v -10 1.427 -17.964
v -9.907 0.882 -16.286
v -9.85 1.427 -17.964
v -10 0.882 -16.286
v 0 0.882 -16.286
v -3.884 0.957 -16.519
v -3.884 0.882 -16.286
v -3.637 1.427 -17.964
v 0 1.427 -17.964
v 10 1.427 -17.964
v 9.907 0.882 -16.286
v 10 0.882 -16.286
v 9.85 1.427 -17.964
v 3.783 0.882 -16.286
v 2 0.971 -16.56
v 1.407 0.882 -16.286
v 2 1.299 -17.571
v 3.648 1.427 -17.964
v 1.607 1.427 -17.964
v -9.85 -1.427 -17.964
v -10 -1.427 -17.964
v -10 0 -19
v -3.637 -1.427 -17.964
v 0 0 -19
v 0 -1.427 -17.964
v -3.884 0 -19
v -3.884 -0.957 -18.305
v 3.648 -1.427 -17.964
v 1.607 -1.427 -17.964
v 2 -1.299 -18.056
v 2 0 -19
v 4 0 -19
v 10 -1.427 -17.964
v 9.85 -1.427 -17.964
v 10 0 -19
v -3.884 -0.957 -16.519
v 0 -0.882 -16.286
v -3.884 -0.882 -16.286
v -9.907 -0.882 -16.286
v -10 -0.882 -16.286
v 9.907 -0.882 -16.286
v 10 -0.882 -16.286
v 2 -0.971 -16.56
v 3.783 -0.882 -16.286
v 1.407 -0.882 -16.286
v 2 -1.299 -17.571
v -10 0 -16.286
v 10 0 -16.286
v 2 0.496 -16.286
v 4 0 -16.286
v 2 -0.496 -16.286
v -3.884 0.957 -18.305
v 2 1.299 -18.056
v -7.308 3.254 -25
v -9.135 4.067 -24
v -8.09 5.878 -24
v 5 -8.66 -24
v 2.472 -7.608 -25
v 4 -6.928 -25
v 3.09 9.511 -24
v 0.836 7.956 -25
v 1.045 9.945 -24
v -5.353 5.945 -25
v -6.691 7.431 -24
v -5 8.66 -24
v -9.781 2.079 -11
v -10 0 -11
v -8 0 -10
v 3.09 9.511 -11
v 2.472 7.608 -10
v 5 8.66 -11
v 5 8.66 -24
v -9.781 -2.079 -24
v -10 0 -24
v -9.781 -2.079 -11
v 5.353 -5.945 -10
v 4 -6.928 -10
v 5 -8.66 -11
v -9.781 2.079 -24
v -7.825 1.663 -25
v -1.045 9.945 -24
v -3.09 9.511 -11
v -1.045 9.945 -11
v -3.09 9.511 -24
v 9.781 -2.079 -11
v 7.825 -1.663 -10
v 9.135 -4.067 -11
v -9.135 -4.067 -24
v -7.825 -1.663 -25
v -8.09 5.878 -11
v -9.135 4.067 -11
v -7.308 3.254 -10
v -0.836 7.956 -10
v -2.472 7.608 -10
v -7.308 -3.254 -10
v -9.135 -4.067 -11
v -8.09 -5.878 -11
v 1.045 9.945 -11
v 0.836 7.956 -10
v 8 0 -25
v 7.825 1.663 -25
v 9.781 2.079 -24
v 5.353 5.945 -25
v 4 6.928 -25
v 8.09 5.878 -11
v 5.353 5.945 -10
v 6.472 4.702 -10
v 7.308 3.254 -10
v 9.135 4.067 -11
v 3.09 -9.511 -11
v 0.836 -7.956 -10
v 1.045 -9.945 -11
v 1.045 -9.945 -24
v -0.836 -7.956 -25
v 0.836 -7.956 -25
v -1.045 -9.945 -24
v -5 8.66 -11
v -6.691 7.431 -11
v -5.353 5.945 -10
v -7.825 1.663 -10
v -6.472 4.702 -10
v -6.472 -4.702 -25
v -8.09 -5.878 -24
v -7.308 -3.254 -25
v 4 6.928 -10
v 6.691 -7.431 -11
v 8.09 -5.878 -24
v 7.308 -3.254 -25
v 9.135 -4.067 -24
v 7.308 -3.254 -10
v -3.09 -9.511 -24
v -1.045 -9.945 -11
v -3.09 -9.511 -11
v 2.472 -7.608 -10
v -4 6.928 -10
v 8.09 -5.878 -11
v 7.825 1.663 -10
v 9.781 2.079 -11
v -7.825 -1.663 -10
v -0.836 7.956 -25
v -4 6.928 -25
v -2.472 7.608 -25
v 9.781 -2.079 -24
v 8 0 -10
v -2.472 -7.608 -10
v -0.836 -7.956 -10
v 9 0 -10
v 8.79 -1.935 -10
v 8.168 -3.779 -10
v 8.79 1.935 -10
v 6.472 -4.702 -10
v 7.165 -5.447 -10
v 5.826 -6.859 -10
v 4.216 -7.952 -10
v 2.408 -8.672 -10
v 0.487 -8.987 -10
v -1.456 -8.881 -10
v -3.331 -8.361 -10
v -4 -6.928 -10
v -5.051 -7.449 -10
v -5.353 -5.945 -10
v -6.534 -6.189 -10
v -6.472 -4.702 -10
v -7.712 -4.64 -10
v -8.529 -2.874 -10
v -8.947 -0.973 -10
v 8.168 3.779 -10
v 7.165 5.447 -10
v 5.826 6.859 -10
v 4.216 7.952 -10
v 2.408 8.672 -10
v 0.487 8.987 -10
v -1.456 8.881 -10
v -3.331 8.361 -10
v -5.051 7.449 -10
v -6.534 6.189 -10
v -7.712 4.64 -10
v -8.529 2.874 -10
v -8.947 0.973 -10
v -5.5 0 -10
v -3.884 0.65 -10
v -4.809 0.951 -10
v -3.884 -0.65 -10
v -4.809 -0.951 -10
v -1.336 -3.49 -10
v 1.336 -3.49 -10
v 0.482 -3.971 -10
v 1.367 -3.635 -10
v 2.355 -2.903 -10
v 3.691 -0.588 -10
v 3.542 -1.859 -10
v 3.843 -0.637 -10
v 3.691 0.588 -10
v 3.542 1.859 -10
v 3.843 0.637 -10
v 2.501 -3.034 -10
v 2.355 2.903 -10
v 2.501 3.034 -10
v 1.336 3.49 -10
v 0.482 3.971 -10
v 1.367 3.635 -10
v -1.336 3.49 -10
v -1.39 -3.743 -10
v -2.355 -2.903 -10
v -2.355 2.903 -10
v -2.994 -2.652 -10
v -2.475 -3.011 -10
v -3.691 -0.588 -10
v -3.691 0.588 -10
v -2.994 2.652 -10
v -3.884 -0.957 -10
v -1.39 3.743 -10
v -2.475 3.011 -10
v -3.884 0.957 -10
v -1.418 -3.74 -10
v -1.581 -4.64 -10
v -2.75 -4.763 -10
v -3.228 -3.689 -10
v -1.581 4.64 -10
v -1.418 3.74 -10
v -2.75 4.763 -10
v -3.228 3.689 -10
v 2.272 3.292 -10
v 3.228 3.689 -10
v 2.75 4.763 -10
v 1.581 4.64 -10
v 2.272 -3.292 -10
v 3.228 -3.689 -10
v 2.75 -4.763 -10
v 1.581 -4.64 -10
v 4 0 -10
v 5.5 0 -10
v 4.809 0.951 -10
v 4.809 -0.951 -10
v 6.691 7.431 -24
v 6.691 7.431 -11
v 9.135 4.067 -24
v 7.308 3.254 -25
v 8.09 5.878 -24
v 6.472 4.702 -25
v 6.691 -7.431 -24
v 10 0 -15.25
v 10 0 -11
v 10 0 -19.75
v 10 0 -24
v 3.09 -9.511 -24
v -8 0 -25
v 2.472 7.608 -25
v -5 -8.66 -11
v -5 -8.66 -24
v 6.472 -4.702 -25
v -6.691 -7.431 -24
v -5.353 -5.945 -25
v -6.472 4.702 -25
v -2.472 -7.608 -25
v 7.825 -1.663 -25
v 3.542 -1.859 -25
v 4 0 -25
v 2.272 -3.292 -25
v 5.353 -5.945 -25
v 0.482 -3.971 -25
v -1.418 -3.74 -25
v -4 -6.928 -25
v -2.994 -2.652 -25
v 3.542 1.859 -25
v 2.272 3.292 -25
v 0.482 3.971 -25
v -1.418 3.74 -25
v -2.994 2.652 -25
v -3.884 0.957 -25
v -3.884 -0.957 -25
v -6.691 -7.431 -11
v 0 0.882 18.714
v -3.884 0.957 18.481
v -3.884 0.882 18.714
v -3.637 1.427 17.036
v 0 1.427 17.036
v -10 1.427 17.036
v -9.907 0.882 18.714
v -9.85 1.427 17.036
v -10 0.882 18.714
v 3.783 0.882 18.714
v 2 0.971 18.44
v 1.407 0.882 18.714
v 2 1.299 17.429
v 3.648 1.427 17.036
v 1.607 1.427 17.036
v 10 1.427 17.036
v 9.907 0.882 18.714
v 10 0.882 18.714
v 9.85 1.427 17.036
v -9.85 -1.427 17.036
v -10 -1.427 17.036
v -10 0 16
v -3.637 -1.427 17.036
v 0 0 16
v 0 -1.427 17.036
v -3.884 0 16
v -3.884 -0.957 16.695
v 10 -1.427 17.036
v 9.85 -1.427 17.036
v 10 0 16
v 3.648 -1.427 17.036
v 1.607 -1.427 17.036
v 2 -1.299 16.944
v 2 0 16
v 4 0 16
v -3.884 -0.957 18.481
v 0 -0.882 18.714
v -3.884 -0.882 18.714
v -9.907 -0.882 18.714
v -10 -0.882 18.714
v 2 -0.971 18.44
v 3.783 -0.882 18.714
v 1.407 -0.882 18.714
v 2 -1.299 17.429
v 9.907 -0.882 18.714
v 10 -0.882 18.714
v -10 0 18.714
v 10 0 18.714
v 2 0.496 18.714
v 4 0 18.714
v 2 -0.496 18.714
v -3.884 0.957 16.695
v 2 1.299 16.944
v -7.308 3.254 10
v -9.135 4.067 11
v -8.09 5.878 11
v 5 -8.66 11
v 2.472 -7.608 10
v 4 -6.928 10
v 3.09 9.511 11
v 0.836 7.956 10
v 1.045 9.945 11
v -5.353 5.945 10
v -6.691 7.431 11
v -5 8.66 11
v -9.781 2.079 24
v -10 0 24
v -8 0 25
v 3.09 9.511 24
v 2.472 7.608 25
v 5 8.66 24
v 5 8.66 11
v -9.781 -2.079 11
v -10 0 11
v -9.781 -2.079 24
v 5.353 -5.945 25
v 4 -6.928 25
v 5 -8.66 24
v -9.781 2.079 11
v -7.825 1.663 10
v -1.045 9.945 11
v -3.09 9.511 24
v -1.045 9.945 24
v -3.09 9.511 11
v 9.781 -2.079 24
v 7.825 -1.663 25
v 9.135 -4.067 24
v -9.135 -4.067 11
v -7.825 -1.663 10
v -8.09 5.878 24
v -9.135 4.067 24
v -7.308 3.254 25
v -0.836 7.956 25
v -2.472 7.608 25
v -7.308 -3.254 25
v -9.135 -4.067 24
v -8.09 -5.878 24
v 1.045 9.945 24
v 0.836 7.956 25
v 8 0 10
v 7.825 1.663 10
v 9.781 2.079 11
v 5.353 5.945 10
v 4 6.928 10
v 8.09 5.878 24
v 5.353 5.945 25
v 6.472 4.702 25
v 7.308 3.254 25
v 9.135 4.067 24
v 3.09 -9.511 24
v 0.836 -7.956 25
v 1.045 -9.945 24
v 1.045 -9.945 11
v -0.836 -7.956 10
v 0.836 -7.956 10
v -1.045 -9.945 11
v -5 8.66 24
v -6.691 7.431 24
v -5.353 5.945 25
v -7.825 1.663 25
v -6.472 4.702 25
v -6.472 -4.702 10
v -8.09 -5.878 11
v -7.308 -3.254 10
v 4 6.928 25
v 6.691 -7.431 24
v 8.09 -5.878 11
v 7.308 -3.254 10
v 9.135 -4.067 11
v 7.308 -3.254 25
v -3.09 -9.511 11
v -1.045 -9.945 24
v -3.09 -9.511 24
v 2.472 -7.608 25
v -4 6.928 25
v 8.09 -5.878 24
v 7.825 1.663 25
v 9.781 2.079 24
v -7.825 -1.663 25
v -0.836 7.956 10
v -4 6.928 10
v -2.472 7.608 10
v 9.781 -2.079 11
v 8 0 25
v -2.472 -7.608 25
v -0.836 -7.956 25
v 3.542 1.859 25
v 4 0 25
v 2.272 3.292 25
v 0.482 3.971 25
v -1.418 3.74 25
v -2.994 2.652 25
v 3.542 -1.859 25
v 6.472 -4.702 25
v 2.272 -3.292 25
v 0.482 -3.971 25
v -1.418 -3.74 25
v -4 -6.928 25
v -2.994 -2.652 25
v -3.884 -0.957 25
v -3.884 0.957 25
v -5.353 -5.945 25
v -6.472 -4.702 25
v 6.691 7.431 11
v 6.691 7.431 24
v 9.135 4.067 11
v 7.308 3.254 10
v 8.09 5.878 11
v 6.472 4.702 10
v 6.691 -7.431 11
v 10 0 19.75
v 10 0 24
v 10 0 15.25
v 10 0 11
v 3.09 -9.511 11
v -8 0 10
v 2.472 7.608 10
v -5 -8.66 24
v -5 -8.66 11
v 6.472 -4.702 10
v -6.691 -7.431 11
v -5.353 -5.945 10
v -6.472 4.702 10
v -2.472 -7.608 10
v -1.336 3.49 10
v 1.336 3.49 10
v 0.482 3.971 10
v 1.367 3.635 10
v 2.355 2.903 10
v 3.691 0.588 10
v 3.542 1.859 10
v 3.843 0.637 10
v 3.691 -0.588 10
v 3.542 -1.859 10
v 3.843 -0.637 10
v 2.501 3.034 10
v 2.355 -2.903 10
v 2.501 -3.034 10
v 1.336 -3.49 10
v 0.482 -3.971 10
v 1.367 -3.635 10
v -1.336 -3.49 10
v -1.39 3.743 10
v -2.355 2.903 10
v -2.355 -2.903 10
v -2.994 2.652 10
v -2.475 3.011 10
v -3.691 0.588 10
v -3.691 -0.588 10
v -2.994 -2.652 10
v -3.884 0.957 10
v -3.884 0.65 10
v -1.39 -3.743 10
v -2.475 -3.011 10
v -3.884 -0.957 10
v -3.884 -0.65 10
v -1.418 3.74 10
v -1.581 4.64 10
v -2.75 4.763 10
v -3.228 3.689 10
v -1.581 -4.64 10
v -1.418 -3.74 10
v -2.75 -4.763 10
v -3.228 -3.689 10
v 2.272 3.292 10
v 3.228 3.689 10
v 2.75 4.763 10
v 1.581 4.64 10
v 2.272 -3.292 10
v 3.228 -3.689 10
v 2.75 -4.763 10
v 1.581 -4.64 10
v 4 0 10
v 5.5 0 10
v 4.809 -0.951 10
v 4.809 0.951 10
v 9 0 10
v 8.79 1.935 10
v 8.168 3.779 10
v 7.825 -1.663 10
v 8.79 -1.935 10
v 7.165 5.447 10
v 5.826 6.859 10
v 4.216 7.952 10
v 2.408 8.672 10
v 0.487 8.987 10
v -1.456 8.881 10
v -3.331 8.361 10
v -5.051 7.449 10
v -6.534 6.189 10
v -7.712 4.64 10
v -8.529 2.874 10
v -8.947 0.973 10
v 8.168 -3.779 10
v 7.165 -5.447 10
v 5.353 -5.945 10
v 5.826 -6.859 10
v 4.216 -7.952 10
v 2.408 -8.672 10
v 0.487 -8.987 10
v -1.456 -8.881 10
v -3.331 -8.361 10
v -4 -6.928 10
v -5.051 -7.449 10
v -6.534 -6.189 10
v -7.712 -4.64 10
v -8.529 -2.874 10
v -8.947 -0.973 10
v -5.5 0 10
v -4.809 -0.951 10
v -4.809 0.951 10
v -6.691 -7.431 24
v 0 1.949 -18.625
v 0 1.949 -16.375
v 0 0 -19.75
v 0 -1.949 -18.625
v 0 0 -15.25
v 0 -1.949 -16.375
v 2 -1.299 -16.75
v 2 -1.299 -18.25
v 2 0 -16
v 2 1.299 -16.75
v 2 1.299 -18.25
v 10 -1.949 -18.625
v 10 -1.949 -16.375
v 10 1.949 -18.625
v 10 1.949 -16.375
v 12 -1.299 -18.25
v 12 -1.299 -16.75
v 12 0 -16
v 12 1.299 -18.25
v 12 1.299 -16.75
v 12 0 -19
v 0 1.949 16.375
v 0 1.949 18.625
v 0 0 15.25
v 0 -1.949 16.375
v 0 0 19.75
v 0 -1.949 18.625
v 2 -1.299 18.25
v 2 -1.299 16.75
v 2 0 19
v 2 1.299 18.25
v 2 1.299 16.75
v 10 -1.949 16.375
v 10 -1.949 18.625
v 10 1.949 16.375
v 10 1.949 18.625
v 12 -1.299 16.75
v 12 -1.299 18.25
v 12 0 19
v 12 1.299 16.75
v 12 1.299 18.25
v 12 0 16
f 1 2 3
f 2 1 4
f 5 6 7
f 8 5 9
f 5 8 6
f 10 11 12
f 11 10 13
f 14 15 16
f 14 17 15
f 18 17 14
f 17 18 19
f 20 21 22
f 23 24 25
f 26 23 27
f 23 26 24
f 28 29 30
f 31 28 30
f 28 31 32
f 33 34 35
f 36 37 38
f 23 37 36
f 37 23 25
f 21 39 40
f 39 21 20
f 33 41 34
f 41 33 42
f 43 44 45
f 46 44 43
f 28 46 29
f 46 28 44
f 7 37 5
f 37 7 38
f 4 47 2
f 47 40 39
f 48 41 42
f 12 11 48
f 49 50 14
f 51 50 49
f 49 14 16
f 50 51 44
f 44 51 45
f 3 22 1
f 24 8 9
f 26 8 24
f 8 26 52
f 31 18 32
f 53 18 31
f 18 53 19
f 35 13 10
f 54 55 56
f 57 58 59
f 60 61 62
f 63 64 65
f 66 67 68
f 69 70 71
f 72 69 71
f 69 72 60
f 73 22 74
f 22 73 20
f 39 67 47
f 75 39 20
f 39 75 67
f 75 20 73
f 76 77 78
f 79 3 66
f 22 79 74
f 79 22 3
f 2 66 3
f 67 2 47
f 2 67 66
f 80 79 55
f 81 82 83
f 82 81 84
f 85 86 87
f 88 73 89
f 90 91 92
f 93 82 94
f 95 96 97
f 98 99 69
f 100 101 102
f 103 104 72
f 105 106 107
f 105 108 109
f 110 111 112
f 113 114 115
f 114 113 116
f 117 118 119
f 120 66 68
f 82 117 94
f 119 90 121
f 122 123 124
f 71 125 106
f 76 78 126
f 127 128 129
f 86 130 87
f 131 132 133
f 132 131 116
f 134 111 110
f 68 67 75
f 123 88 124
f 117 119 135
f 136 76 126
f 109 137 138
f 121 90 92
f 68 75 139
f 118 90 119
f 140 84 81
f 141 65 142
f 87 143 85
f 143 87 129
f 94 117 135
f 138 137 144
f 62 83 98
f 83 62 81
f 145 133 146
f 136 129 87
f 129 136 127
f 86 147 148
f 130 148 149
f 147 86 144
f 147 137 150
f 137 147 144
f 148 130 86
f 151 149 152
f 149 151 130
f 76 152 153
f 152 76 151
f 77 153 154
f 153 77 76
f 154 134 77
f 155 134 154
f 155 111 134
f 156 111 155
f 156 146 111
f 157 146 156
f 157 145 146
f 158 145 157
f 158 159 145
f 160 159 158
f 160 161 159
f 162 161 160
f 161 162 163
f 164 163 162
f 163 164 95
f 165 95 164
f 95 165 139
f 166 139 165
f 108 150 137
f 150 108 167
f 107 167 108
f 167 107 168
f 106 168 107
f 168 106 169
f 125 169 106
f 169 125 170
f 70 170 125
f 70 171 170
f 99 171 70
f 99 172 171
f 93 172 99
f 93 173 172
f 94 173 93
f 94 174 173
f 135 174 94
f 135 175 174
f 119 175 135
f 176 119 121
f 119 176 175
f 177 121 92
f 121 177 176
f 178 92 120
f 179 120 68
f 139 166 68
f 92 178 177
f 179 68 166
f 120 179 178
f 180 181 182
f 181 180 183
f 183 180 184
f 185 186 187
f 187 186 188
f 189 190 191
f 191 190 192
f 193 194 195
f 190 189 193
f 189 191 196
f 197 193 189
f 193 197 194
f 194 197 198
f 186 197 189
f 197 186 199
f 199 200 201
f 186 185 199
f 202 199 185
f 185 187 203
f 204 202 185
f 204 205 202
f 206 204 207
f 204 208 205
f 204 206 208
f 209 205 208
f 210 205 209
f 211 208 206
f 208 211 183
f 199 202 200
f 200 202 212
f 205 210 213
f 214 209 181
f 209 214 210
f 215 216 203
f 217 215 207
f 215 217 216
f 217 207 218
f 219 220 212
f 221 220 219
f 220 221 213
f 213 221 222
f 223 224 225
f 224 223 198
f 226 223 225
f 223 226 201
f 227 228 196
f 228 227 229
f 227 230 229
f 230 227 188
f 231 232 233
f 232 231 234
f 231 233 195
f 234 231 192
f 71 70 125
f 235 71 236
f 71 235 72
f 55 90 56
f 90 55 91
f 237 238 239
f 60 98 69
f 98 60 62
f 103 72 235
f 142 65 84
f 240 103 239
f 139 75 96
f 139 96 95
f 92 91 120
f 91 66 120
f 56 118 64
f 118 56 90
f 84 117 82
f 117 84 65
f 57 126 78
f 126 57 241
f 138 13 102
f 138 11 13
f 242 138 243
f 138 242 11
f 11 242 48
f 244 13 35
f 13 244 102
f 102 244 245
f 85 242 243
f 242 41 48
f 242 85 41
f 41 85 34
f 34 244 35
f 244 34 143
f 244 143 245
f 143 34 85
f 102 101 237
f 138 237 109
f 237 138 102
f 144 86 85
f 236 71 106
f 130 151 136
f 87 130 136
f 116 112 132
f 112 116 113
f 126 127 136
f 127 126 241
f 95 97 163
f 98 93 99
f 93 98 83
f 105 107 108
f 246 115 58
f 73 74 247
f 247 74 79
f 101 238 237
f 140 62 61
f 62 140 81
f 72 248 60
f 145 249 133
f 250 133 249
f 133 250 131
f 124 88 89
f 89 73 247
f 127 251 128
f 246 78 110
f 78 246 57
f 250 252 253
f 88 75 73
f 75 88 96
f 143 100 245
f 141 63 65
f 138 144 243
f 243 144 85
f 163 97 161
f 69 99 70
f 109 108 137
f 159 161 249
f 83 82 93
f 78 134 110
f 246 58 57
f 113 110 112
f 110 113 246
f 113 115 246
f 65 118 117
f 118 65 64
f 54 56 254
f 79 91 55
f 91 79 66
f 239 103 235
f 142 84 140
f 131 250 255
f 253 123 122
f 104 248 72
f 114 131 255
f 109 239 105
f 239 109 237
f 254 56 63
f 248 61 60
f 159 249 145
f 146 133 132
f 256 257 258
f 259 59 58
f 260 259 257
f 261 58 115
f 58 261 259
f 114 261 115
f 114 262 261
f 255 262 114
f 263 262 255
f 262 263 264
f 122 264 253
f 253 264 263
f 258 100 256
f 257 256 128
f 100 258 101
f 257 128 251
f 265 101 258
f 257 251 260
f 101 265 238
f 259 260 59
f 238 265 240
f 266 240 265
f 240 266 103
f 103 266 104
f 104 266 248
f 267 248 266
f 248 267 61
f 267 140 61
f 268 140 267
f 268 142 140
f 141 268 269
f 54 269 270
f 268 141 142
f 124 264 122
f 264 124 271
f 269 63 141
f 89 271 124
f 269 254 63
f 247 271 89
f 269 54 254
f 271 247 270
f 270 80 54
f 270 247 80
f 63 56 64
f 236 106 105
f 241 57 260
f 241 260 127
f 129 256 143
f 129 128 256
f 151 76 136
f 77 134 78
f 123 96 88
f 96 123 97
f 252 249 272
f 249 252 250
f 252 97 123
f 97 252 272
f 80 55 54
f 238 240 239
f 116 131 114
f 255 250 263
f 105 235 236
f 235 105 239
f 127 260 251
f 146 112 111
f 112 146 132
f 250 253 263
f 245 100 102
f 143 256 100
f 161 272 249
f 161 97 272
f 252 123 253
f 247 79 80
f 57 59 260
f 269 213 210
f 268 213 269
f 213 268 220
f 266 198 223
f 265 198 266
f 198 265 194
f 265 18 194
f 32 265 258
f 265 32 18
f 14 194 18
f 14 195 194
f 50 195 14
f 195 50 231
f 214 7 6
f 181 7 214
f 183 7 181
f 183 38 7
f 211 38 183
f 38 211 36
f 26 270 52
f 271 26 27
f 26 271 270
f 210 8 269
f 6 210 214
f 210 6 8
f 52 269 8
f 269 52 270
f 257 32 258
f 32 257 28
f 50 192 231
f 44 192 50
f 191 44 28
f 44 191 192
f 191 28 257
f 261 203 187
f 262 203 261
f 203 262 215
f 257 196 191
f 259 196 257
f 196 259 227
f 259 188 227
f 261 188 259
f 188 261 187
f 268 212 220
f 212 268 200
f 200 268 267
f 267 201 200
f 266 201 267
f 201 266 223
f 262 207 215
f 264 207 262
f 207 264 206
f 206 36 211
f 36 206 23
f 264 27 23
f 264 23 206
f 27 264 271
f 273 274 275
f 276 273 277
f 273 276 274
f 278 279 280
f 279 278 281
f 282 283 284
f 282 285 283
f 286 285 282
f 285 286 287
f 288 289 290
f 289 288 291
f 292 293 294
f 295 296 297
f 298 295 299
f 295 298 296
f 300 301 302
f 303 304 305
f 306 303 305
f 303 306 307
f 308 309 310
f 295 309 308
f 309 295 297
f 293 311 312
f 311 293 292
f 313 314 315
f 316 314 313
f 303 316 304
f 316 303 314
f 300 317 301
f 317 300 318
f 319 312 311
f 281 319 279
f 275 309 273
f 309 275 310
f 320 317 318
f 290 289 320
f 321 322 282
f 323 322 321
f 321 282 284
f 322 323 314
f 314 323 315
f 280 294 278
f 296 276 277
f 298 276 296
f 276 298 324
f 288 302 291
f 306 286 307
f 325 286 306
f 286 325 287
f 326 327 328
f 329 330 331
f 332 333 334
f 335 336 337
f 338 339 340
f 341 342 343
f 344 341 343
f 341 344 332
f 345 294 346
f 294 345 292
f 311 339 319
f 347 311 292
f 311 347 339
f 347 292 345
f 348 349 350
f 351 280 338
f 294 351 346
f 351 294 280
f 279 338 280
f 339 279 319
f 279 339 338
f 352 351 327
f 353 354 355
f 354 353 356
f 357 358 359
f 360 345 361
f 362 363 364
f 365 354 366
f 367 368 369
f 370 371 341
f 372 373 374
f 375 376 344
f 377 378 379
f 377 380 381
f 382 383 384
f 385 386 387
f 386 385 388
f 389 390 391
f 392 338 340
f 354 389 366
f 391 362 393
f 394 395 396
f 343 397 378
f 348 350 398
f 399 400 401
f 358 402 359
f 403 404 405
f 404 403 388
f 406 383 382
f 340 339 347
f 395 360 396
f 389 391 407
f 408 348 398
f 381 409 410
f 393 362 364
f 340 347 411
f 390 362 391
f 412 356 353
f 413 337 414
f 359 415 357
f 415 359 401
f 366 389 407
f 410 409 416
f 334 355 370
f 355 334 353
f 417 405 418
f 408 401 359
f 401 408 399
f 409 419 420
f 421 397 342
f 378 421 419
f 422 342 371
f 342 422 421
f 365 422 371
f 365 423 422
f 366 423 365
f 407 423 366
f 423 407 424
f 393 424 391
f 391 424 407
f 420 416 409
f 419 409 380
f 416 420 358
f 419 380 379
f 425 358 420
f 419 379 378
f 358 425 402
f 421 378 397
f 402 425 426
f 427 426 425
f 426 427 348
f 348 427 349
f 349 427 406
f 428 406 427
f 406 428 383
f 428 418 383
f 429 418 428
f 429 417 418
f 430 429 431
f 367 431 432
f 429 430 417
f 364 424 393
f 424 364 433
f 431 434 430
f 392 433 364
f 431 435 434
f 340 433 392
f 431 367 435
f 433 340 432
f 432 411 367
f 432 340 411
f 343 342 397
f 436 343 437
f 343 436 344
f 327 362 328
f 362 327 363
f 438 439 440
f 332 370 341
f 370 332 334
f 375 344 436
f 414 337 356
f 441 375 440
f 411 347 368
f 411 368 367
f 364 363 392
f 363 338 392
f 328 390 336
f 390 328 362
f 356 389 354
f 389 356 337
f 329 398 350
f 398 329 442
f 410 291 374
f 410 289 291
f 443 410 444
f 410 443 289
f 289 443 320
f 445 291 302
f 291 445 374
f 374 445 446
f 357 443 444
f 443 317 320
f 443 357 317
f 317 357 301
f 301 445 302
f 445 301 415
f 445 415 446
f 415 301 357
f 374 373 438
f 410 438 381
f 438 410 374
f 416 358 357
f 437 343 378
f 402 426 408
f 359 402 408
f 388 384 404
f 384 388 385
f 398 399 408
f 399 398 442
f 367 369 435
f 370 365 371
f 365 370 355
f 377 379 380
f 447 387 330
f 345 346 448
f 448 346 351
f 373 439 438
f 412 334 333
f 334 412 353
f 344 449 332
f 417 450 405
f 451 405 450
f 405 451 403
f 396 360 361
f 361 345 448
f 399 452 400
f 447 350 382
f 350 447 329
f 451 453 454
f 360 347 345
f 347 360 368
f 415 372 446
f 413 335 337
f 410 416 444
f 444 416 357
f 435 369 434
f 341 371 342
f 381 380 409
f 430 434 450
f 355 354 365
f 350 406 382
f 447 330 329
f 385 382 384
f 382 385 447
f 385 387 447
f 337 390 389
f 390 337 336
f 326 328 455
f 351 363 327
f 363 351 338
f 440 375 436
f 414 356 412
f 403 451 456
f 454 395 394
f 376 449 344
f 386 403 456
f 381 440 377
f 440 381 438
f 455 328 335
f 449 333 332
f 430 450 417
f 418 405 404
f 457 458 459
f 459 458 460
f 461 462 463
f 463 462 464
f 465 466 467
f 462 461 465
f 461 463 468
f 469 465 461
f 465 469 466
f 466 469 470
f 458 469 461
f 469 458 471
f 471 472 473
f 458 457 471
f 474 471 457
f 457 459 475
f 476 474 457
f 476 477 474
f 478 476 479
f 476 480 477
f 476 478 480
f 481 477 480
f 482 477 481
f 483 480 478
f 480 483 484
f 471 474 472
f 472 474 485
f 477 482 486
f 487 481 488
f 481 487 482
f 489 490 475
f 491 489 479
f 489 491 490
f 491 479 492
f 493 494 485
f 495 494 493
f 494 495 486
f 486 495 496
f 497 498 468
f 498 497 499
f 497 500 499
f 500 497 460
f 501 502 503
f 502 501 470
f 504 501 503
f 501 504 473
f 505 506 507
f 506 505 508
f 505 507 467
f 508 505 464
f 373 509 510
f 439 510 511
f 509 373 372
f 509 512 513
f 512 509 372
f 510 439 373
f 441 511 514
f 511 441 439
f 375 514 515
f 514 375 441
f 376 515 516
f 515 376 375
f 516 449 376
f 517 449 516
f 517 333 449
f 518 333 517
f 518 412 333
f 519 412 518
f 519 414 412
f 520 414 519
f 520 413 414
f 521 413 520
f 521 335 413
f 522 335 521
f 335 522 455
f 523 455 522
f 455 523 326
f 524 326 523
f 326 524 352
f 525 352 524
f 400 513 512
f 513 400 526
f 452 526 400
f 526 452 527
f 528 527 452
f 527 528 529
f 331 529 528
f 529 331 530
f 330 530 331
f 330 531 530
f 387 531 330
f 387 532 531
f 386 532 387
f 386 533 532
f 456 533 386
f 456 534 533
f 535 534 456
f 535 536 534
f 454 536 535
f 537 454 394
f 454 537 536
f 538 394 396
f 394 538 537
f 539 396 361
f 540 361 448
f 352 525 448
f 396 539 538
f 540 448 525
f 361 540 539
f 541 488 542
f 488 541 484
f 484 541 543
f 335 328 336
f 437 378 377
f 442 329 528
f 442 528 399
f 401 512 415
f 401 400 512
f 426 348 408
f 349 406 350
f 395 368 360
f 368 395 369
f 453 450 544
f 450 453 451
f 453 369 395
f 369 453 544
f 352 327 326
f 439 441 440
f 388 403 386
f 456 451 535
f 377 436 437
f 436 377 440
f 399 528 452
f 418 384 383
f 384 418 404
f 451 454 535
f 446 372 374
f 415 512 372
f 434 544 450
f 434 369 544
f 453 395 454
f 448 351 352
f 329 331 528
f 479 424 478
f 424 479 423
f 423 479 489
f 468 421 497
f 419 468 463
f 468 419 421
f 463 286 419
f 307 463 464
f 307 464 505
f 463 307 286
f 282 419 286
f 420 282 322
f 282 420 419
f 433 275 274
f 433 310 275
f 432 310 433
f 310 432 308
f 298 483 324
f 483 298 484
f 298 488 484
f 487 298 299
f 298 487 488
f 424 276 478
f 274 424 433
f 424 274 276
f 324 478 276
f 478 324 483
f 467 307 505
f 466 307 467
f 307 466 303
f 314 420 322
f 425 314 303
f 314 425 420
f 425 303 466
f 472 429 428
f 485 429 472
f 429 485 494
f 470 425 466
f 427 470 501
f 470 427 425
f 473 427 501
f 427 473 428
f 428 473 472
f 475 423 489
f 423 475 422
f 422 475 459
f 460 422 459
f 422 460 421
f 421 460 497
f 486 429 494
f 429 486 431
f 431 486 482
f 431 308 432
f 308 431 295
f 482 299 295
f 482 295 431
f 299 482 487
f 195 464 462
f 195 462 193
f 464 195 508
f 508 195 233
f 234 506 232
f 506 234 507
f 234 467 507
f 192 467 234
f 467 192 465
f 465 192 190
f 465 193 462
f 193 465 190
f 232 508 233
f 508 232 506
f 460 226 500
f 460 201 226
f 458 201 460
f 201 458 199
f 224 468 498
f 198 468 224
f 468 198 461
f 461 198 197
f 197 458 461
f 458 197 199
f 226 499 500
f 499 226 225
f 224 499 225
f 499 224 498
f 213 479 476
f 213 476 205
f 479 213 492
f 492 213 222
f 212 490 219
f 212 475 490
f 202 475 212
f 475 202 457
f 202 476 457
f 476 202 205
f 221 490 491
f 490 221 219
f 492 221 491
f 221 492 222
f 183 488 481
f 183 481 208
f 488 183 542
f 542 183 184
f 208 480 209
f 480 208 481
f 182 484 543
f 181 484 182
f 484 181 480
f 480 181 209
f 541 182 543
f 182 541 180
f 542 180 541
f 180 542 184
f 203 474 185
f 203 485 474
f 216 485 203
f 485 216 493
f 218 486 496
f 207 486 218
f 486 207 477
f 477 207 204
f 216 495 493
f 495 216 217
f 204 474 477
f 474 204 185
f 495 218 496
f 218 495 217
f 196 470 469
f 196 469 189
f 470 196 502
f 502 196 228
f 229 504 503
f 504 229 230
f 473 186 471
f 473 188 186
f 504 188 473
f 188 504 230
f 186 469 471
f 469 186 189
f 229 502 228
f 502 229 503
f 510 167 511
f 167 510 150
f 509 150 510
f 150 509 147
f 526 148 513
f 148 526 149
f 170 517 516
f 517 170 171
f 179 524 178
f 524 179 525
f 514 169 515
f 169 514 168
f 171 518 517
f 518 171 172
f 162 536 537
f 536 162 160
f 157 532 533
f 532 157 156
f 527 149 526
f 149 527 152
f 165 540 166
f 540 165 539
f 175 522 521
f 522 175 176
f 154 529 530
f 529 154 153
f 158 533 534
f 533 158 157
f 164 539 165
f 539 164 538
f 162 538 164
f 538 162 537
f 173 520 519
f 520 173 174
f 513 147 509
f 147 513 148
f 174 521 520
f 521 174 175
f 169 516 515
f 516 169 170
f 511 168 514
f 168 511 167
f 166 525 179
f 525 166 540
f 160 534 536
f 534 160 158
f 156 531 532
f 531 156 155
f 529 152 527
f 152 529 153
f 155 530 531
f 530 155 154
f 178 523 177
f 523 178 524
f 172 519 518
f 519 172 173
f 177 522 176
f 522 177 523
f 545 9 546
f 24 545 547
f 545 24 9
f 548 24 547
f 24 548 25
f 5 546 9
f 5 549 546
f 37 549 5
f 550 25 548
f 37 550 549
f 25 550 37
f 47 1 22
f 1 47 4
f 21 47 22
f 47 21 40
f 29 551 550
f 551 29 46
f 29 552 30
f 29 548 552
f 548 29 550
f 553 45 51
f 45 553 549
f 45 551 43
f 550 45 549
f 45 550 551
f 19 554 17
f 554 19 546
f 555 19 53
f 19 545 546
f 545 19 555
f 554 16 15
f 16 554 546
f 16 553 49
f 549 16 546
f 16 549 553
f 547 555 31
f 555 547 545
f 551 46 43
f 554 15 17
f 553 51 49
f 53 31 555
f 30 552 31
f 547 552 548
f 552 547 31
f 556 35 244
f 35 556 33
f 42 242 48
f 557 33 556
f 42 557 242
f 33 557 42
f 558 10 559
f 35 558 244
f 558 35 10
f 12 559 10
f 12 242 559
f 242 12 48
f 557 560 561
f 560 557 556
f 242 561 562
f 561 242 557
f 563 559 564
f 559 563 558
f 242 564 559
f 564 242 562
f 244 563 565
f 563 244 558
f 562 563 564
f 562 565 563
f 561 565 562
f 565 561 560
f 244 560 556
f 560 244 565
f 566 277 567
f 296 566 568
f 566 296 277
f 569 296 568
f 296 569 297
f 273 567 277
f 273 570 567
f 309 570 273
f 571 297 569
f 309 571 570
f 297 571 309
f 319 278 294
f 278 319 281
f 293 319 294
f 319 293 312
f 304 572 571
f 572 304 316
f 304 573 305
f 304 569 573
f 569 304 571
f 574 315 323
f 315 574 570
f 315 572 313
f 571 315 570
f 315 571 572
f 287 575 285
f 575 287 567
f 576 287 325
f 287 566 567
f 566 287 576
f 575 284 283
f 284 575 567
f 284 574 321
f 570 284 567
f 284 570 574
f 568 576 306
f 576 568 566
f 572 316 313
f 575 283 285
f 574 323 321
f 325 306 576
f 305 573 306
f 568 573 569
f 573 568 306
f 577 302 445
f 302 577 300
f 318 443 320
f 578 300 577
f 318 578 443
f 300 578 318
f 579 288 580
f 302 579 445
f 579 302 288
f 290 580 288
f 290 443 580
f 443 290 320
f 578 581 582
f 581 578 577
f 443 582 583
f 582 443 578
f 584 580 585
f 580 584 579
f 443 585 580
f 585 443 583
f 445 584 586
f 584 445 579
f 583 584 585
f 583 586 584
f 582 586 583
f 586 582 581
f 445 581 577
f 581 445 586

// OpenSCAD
// Parameters
hub_diameter = 20;
hub_length = 15;
bore_diameter = 8;
slot_width = 2;
slot_depth = 8;
fastener_diameter = 3;
fastener_length = 10;
flexible_element_length = 20;
flexible_element_diameter = 18;
slot_count = 6;
clamping_slot_depth = 5;
clamping_slot_width = 3;
chamfer_size = 2; // Added chamfering for smoother edges

// Clamping Hub Module
module clamping_hub() {
    difference() {
        // Main cylindrical hub with chamfered edges
        hull() {
            cylinder(h = hub_length - chamfer_size, d = hub_diameter, center = true);
            translate([0, 0, hub_length / 2 - chamfer_size])
                cylinder(h = chamfer_size, d1 = hub_diameter, d2 = hub_diameter - 4, center = false);
            translate([0, 0, -hub_length / 2])
                cylinder(h = chamfer_size, d1 = hub_diameter - 4, d2 = hub_diameter, center = false);
        }
        
        // Central bore
        cylinder(h = hub_length + 2, d = bore_diameter, center = true);
        
        // Rounded clamping slots
        for (i = [-1, 1]) {
            translate([i * hub_diameter / 4, 0, 0])
                rotate([0, 90, 0])
                hull() {
                    translate([0, 0, -clamping_slot_depth / 2])
                        cylinder(h = clamping_slot_depth, d = clamping_slot_width, center = true);
                    translate([0, 0, clamping_slot_depth / 2])
                        cylinder(h = clamping_slot_depth, d = clamping_slot_width, center = true);
                }
        }
        
        // Fastener holes with proper alignment
        for (i = [-1, 1]) {
            translate([i * hub_diameter / 4, 0, 0])
                rotate([0, 90, 0])
                cylinder(h = hub_diameter + 2, d = fastener_diameter, center = true);
        }
    }
}

// Flexible Element Module
module flexible_element() {
    difference() {
        // Main cylindrical body with smoother shape
        cylinder(h = flexible_element_length, d = flexible_element_diameter, center = true);
        
        // Rounded slotted cuts for flexibility
        for (i = [0:slot_count-1]) {
            rotate([0, 0, i * (360 / slot_count)])
                translate([flexible_element_diameter / 4, 0, 0])
                hull() {
                    translate([0, 0, -flexible_element_length / 2])
                        cylinder(h = flexible_element_length, d = slot_width, center = true);
                    translate([0, 0, flexible_element_length / 2])
                        cylinder(h = flexible_element_length, d = slot_width, center = true);
                }
        }
    }
}

// Fastener Module with Hex Head
module fastener() {
    union() {
        // Main fastener body
        cylinder(h = fastener_length, d = fastener_diameter, center = true);
        
        // Hexagonal head
        translate([0, 0, fastener_length / 2])
            cylinder(h = 2, d1 = fastener_diameter * 1.5, d2 = fastener_diameter, $fn = 6, center = false);
    }
}

// Assembly
module flexible_coupling() {
    // Clamping Hub 1
    translate([0, 0, -flexible_element_length / 2 - hub_length / 2])
        clamping_hub();
    
    // Clamping Hub 2
    translate([0, 0, flexible_element_length / 2 + hub_length / 2])
        clamping_hub();
    
    // Flexible Element
    flexible_element();
    
    // Fasteners for Clamping Hub 1
    for (i = [-1, 1]) {
        translate([i * hub_diameter / 4, 0, -flexible_element_length / 2 - hub_length / 2])
            rotate([0, 90, 0])
            fastener();
    }
    
    // Fasteners for Clamping Hub 2
    for (i = [-1, 1]) {
        translate([i * hub_diameter / 4, 0, flexible_element_length / 2 + hub_length / 2])
            rotate([0, 90, 0])
            fastener();
    }
}

// Render the complete assembly
flexible_coupling();
